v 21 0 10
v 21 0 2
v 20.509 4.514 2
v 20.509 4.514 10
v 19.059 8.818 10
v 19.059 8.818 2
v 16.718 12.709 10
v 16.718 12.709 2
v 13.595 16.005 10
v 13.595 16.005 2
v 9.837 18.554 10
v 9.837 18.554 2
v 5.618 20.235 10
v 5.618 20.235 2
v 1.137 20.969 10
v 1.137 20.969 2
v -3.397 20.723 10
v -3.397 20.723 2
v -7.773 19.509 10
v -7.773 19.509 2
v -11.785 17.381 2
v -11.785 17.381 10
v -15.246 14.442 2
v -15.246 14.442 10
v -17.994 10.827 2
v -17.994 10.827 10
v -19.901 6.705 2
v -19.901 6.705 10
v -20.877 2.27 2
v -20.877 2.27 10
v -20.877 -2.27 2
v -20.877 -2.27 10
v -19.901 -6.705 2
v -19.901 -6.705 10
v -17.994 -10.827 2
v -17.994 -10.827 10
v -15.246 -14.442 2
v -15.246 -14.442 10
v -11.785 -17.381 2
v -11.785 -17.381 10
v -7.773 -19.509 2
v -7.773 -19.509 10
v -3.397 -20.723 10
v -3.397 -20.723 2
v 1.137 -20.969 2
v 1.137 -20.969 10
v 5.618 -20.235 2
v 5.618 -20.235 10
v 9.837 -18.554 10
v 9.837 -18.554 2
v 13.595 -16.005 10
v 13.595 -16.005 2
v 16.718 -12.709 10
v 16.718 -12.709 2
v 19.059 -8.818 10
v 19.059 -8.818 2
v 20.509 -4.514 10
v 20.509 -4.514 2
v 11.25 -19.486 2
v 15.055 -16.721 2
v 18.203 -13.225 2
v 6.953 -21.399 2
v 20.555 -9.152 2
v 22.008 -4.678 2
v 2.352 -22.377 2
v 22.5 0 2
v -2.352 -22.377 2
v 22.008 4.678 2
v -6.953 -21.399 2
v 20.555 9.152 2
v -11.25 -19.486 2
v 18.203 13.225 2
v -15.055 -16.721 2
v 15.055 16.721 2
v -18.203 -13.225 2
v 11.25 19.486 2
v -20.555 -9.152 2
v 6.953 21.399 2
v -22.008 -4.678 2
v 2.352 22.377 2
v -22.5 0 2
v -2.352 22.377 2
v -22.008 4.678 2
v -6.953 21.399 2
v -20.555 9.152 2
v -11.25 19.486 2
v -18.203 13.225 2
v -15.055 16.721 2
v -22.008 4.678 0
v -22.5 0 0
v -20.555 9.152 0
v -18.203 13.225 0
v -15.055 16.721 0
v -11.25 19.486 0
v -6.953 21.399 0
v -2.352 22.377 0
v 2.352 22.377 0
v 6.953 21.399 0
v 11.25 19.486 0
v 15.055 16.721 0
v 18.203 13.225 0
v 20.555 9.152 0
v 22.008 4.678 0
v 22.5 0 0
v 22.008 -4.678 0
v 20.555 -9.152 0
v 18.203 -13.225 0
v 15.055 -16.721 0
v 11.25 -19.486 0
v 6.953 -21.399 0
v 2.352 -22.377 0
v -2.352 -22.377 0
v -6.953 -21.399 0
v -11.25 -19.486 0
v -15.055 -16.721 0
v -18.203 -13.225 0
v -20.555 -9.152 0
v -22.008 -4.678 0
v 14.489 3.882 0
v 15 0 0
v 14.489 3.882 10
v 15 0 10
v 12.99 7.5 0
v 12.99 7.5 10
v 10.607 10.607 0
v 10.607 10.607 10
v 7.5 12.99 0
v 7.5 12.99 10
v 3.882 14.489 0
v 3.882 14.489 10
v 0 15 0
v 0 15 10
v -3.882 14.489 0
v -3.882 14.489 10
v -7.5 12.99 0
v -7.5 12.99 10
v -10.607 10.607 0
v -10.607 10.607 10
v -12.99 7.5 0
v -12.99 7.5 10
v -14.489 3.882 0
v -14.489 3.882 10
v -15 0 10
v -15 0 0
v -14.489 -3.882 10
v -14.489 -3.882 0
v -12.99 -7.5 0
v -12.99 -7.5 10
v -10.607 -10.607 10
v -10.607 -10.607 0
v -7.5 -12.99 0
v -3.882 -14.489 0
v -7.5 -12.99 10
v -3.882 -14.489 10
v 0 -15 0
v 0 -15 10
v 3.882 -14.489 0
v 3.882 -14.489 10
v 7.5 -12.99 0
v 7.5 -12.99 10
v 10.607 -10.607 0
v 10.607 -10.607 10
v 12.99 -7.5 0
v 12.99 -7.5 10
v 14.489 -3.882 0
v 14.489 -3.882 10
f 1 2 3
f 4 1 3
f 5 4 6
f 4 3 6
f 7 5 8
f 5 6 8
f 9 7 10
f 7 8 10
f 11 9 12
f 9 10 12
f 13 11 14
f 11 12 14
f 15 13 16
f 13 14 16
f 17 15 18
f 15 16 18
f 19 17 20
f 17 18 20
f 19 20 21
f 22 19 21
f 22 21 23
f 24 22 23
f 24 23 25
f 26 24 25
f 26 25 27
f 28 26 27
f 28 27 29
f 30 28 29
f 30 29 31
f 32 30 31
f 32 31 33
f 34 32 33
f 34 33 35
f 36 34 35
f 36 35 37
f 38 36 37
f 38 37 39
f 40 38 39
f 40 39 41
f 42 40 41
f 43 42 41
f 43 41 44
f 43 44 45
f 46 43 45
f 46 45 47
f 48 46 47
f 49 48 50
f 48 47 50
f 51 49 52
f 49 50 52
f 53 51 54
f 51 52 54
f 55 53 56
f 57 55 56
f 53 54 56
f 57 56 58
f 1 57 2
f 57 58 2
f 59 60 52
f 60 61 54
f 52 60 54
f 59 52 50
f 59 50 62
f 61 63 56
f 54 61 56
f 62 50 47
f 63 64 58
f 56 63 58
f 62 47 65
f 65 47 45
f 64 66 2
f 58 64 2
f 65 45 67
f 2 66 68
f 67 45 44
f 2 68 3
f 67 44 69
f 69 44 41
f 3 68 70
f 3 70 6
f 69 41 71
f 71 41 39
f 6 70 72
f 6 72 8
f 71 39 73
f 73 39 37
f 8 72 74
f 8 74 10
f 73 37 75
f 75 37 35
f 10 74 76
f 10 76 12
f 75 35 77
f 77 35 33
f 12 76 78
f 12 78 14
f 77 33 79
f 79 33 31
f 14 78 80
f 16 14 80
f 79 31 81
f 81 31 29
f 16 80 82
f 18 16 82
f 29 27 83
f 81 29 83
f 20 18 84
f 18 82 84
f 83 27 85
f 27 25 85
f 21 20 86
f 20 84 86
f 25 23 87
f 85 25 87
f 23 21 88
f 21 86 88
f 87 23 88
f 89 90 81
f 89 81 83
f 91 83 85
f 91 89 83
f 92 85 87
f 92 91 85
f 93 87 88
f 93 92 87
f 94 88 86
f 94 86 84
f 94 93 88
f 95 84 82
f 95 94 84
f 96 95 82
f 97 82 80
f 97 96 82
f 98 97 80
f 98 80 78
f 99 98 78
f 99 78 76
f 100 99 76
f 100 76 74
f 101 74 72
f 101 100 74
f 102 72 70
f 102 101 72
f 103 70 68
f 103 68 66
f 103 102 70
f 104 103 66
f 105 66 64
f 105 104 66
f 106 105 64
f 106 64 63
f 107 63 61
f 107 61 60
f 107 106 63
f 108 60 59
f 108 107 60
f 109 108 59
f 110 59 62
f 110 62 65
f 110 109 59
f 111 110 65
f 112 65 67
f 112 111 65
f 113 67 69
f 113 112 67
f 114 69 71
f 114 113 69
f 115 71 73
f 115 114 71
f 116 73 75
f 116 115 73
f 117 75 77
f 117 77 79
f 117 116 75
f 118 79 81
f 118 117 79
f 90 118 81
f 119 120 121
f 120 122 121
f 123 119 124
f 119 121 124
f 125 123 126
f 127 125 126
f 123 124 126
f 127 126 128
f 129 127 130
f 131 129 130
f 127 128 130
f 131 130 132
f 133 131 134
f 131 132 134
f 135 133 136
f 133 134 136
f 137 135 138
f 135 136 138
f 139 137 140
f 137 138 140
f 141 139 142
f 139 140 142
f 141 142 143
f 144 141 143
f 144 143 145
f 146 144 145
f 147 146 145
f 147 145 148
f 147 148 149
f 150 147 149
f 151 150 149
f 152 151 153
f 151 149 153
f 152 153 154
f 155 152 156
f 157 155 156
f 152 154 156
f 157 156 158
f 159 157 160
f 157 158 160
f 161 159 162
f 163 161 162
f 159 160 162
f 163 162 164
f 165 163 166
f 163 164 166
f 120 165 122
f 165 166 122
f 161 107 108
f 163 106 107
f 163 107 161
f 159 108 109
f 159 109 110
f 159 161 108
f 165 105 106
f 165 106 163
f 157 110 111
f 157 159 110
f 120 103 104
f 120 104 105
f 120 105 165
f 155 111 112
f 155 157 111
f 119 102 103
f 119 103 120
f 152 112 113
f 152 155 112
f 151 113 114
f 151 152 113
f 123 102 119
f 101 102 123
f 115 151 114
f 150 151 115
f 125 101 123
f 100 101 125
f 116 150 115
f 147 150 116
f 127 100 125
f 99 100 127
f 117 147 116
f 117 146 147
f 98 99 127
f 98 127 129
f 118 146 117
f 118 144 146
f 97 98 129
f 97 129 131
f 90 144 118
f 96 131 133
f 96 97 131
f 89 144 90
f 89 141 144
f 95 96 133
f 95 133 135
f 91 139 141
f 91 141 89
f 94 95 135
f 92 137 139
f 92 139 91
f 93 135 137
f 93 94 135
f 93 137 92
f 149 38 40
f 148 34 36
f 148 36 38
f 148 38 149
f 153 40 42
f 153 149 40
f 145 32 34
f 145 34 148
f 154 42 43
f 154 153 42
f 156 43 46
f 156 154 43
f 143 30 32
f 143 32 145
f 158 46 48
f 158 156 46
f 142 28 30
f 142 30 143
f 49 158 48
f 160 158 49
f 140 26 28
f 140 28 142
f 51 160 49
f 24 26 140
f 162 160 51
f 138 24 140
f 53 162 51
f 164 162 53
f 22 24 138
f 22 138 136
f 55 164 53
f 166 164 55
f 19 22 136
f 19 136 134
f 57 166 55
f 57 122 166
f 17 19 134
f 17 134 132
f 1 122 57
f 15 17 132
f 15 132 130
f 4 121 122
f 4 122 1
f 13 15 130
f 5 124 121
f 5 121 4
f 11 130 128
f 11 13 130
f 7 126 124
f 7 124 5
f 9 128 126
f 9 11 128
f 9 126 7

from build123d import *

# Parameters (mm, degrees)
SKETCH1_R           = 21
SKETCH1_R_2         = 15
BOSS_EXTRUDE1_DEPTH = 10
SKETCH6_R           = 22.5
BOSS_EXTRUDE2_DEPTH = 2
SKETCH7_R           = 15
CUT_EXTRUDE1_DEPTH  = 34.35416016


with BuildPart() as part:
    # Sketch1 → Boss-Extrude1 (new body)
    with BuildSketch(Plane.XY):
        Circle(SKETCH1_R)
        Circle(SKETCH1_R_2, mode=Mode.SUBTRACT)
    extrude(amount=BOSS_EXTRUDE1_DEPTH)

    # Sketch6 → Boss-Extrude2 (add)
    with BuildSketch(Plane(origin=(0, 0, 0), x_dir=(-1, 0, 0), z_dir=(0, 0, -1))):
        Circle(SKETCH6_R)
    extrude(amount=-BOSS_EXTRUDE2_DEPTH)

    # Sketch7 → Cut-Extrude1 (cut, through all)
    with BuildSketch(Plane.XY.offset(10)):
        Circle(SKETCH7_R)
    extrude(amount=-CUT_EXTRUDE1_DEPTH, mode=Mode.SUBTRACT)


solid = part.part
